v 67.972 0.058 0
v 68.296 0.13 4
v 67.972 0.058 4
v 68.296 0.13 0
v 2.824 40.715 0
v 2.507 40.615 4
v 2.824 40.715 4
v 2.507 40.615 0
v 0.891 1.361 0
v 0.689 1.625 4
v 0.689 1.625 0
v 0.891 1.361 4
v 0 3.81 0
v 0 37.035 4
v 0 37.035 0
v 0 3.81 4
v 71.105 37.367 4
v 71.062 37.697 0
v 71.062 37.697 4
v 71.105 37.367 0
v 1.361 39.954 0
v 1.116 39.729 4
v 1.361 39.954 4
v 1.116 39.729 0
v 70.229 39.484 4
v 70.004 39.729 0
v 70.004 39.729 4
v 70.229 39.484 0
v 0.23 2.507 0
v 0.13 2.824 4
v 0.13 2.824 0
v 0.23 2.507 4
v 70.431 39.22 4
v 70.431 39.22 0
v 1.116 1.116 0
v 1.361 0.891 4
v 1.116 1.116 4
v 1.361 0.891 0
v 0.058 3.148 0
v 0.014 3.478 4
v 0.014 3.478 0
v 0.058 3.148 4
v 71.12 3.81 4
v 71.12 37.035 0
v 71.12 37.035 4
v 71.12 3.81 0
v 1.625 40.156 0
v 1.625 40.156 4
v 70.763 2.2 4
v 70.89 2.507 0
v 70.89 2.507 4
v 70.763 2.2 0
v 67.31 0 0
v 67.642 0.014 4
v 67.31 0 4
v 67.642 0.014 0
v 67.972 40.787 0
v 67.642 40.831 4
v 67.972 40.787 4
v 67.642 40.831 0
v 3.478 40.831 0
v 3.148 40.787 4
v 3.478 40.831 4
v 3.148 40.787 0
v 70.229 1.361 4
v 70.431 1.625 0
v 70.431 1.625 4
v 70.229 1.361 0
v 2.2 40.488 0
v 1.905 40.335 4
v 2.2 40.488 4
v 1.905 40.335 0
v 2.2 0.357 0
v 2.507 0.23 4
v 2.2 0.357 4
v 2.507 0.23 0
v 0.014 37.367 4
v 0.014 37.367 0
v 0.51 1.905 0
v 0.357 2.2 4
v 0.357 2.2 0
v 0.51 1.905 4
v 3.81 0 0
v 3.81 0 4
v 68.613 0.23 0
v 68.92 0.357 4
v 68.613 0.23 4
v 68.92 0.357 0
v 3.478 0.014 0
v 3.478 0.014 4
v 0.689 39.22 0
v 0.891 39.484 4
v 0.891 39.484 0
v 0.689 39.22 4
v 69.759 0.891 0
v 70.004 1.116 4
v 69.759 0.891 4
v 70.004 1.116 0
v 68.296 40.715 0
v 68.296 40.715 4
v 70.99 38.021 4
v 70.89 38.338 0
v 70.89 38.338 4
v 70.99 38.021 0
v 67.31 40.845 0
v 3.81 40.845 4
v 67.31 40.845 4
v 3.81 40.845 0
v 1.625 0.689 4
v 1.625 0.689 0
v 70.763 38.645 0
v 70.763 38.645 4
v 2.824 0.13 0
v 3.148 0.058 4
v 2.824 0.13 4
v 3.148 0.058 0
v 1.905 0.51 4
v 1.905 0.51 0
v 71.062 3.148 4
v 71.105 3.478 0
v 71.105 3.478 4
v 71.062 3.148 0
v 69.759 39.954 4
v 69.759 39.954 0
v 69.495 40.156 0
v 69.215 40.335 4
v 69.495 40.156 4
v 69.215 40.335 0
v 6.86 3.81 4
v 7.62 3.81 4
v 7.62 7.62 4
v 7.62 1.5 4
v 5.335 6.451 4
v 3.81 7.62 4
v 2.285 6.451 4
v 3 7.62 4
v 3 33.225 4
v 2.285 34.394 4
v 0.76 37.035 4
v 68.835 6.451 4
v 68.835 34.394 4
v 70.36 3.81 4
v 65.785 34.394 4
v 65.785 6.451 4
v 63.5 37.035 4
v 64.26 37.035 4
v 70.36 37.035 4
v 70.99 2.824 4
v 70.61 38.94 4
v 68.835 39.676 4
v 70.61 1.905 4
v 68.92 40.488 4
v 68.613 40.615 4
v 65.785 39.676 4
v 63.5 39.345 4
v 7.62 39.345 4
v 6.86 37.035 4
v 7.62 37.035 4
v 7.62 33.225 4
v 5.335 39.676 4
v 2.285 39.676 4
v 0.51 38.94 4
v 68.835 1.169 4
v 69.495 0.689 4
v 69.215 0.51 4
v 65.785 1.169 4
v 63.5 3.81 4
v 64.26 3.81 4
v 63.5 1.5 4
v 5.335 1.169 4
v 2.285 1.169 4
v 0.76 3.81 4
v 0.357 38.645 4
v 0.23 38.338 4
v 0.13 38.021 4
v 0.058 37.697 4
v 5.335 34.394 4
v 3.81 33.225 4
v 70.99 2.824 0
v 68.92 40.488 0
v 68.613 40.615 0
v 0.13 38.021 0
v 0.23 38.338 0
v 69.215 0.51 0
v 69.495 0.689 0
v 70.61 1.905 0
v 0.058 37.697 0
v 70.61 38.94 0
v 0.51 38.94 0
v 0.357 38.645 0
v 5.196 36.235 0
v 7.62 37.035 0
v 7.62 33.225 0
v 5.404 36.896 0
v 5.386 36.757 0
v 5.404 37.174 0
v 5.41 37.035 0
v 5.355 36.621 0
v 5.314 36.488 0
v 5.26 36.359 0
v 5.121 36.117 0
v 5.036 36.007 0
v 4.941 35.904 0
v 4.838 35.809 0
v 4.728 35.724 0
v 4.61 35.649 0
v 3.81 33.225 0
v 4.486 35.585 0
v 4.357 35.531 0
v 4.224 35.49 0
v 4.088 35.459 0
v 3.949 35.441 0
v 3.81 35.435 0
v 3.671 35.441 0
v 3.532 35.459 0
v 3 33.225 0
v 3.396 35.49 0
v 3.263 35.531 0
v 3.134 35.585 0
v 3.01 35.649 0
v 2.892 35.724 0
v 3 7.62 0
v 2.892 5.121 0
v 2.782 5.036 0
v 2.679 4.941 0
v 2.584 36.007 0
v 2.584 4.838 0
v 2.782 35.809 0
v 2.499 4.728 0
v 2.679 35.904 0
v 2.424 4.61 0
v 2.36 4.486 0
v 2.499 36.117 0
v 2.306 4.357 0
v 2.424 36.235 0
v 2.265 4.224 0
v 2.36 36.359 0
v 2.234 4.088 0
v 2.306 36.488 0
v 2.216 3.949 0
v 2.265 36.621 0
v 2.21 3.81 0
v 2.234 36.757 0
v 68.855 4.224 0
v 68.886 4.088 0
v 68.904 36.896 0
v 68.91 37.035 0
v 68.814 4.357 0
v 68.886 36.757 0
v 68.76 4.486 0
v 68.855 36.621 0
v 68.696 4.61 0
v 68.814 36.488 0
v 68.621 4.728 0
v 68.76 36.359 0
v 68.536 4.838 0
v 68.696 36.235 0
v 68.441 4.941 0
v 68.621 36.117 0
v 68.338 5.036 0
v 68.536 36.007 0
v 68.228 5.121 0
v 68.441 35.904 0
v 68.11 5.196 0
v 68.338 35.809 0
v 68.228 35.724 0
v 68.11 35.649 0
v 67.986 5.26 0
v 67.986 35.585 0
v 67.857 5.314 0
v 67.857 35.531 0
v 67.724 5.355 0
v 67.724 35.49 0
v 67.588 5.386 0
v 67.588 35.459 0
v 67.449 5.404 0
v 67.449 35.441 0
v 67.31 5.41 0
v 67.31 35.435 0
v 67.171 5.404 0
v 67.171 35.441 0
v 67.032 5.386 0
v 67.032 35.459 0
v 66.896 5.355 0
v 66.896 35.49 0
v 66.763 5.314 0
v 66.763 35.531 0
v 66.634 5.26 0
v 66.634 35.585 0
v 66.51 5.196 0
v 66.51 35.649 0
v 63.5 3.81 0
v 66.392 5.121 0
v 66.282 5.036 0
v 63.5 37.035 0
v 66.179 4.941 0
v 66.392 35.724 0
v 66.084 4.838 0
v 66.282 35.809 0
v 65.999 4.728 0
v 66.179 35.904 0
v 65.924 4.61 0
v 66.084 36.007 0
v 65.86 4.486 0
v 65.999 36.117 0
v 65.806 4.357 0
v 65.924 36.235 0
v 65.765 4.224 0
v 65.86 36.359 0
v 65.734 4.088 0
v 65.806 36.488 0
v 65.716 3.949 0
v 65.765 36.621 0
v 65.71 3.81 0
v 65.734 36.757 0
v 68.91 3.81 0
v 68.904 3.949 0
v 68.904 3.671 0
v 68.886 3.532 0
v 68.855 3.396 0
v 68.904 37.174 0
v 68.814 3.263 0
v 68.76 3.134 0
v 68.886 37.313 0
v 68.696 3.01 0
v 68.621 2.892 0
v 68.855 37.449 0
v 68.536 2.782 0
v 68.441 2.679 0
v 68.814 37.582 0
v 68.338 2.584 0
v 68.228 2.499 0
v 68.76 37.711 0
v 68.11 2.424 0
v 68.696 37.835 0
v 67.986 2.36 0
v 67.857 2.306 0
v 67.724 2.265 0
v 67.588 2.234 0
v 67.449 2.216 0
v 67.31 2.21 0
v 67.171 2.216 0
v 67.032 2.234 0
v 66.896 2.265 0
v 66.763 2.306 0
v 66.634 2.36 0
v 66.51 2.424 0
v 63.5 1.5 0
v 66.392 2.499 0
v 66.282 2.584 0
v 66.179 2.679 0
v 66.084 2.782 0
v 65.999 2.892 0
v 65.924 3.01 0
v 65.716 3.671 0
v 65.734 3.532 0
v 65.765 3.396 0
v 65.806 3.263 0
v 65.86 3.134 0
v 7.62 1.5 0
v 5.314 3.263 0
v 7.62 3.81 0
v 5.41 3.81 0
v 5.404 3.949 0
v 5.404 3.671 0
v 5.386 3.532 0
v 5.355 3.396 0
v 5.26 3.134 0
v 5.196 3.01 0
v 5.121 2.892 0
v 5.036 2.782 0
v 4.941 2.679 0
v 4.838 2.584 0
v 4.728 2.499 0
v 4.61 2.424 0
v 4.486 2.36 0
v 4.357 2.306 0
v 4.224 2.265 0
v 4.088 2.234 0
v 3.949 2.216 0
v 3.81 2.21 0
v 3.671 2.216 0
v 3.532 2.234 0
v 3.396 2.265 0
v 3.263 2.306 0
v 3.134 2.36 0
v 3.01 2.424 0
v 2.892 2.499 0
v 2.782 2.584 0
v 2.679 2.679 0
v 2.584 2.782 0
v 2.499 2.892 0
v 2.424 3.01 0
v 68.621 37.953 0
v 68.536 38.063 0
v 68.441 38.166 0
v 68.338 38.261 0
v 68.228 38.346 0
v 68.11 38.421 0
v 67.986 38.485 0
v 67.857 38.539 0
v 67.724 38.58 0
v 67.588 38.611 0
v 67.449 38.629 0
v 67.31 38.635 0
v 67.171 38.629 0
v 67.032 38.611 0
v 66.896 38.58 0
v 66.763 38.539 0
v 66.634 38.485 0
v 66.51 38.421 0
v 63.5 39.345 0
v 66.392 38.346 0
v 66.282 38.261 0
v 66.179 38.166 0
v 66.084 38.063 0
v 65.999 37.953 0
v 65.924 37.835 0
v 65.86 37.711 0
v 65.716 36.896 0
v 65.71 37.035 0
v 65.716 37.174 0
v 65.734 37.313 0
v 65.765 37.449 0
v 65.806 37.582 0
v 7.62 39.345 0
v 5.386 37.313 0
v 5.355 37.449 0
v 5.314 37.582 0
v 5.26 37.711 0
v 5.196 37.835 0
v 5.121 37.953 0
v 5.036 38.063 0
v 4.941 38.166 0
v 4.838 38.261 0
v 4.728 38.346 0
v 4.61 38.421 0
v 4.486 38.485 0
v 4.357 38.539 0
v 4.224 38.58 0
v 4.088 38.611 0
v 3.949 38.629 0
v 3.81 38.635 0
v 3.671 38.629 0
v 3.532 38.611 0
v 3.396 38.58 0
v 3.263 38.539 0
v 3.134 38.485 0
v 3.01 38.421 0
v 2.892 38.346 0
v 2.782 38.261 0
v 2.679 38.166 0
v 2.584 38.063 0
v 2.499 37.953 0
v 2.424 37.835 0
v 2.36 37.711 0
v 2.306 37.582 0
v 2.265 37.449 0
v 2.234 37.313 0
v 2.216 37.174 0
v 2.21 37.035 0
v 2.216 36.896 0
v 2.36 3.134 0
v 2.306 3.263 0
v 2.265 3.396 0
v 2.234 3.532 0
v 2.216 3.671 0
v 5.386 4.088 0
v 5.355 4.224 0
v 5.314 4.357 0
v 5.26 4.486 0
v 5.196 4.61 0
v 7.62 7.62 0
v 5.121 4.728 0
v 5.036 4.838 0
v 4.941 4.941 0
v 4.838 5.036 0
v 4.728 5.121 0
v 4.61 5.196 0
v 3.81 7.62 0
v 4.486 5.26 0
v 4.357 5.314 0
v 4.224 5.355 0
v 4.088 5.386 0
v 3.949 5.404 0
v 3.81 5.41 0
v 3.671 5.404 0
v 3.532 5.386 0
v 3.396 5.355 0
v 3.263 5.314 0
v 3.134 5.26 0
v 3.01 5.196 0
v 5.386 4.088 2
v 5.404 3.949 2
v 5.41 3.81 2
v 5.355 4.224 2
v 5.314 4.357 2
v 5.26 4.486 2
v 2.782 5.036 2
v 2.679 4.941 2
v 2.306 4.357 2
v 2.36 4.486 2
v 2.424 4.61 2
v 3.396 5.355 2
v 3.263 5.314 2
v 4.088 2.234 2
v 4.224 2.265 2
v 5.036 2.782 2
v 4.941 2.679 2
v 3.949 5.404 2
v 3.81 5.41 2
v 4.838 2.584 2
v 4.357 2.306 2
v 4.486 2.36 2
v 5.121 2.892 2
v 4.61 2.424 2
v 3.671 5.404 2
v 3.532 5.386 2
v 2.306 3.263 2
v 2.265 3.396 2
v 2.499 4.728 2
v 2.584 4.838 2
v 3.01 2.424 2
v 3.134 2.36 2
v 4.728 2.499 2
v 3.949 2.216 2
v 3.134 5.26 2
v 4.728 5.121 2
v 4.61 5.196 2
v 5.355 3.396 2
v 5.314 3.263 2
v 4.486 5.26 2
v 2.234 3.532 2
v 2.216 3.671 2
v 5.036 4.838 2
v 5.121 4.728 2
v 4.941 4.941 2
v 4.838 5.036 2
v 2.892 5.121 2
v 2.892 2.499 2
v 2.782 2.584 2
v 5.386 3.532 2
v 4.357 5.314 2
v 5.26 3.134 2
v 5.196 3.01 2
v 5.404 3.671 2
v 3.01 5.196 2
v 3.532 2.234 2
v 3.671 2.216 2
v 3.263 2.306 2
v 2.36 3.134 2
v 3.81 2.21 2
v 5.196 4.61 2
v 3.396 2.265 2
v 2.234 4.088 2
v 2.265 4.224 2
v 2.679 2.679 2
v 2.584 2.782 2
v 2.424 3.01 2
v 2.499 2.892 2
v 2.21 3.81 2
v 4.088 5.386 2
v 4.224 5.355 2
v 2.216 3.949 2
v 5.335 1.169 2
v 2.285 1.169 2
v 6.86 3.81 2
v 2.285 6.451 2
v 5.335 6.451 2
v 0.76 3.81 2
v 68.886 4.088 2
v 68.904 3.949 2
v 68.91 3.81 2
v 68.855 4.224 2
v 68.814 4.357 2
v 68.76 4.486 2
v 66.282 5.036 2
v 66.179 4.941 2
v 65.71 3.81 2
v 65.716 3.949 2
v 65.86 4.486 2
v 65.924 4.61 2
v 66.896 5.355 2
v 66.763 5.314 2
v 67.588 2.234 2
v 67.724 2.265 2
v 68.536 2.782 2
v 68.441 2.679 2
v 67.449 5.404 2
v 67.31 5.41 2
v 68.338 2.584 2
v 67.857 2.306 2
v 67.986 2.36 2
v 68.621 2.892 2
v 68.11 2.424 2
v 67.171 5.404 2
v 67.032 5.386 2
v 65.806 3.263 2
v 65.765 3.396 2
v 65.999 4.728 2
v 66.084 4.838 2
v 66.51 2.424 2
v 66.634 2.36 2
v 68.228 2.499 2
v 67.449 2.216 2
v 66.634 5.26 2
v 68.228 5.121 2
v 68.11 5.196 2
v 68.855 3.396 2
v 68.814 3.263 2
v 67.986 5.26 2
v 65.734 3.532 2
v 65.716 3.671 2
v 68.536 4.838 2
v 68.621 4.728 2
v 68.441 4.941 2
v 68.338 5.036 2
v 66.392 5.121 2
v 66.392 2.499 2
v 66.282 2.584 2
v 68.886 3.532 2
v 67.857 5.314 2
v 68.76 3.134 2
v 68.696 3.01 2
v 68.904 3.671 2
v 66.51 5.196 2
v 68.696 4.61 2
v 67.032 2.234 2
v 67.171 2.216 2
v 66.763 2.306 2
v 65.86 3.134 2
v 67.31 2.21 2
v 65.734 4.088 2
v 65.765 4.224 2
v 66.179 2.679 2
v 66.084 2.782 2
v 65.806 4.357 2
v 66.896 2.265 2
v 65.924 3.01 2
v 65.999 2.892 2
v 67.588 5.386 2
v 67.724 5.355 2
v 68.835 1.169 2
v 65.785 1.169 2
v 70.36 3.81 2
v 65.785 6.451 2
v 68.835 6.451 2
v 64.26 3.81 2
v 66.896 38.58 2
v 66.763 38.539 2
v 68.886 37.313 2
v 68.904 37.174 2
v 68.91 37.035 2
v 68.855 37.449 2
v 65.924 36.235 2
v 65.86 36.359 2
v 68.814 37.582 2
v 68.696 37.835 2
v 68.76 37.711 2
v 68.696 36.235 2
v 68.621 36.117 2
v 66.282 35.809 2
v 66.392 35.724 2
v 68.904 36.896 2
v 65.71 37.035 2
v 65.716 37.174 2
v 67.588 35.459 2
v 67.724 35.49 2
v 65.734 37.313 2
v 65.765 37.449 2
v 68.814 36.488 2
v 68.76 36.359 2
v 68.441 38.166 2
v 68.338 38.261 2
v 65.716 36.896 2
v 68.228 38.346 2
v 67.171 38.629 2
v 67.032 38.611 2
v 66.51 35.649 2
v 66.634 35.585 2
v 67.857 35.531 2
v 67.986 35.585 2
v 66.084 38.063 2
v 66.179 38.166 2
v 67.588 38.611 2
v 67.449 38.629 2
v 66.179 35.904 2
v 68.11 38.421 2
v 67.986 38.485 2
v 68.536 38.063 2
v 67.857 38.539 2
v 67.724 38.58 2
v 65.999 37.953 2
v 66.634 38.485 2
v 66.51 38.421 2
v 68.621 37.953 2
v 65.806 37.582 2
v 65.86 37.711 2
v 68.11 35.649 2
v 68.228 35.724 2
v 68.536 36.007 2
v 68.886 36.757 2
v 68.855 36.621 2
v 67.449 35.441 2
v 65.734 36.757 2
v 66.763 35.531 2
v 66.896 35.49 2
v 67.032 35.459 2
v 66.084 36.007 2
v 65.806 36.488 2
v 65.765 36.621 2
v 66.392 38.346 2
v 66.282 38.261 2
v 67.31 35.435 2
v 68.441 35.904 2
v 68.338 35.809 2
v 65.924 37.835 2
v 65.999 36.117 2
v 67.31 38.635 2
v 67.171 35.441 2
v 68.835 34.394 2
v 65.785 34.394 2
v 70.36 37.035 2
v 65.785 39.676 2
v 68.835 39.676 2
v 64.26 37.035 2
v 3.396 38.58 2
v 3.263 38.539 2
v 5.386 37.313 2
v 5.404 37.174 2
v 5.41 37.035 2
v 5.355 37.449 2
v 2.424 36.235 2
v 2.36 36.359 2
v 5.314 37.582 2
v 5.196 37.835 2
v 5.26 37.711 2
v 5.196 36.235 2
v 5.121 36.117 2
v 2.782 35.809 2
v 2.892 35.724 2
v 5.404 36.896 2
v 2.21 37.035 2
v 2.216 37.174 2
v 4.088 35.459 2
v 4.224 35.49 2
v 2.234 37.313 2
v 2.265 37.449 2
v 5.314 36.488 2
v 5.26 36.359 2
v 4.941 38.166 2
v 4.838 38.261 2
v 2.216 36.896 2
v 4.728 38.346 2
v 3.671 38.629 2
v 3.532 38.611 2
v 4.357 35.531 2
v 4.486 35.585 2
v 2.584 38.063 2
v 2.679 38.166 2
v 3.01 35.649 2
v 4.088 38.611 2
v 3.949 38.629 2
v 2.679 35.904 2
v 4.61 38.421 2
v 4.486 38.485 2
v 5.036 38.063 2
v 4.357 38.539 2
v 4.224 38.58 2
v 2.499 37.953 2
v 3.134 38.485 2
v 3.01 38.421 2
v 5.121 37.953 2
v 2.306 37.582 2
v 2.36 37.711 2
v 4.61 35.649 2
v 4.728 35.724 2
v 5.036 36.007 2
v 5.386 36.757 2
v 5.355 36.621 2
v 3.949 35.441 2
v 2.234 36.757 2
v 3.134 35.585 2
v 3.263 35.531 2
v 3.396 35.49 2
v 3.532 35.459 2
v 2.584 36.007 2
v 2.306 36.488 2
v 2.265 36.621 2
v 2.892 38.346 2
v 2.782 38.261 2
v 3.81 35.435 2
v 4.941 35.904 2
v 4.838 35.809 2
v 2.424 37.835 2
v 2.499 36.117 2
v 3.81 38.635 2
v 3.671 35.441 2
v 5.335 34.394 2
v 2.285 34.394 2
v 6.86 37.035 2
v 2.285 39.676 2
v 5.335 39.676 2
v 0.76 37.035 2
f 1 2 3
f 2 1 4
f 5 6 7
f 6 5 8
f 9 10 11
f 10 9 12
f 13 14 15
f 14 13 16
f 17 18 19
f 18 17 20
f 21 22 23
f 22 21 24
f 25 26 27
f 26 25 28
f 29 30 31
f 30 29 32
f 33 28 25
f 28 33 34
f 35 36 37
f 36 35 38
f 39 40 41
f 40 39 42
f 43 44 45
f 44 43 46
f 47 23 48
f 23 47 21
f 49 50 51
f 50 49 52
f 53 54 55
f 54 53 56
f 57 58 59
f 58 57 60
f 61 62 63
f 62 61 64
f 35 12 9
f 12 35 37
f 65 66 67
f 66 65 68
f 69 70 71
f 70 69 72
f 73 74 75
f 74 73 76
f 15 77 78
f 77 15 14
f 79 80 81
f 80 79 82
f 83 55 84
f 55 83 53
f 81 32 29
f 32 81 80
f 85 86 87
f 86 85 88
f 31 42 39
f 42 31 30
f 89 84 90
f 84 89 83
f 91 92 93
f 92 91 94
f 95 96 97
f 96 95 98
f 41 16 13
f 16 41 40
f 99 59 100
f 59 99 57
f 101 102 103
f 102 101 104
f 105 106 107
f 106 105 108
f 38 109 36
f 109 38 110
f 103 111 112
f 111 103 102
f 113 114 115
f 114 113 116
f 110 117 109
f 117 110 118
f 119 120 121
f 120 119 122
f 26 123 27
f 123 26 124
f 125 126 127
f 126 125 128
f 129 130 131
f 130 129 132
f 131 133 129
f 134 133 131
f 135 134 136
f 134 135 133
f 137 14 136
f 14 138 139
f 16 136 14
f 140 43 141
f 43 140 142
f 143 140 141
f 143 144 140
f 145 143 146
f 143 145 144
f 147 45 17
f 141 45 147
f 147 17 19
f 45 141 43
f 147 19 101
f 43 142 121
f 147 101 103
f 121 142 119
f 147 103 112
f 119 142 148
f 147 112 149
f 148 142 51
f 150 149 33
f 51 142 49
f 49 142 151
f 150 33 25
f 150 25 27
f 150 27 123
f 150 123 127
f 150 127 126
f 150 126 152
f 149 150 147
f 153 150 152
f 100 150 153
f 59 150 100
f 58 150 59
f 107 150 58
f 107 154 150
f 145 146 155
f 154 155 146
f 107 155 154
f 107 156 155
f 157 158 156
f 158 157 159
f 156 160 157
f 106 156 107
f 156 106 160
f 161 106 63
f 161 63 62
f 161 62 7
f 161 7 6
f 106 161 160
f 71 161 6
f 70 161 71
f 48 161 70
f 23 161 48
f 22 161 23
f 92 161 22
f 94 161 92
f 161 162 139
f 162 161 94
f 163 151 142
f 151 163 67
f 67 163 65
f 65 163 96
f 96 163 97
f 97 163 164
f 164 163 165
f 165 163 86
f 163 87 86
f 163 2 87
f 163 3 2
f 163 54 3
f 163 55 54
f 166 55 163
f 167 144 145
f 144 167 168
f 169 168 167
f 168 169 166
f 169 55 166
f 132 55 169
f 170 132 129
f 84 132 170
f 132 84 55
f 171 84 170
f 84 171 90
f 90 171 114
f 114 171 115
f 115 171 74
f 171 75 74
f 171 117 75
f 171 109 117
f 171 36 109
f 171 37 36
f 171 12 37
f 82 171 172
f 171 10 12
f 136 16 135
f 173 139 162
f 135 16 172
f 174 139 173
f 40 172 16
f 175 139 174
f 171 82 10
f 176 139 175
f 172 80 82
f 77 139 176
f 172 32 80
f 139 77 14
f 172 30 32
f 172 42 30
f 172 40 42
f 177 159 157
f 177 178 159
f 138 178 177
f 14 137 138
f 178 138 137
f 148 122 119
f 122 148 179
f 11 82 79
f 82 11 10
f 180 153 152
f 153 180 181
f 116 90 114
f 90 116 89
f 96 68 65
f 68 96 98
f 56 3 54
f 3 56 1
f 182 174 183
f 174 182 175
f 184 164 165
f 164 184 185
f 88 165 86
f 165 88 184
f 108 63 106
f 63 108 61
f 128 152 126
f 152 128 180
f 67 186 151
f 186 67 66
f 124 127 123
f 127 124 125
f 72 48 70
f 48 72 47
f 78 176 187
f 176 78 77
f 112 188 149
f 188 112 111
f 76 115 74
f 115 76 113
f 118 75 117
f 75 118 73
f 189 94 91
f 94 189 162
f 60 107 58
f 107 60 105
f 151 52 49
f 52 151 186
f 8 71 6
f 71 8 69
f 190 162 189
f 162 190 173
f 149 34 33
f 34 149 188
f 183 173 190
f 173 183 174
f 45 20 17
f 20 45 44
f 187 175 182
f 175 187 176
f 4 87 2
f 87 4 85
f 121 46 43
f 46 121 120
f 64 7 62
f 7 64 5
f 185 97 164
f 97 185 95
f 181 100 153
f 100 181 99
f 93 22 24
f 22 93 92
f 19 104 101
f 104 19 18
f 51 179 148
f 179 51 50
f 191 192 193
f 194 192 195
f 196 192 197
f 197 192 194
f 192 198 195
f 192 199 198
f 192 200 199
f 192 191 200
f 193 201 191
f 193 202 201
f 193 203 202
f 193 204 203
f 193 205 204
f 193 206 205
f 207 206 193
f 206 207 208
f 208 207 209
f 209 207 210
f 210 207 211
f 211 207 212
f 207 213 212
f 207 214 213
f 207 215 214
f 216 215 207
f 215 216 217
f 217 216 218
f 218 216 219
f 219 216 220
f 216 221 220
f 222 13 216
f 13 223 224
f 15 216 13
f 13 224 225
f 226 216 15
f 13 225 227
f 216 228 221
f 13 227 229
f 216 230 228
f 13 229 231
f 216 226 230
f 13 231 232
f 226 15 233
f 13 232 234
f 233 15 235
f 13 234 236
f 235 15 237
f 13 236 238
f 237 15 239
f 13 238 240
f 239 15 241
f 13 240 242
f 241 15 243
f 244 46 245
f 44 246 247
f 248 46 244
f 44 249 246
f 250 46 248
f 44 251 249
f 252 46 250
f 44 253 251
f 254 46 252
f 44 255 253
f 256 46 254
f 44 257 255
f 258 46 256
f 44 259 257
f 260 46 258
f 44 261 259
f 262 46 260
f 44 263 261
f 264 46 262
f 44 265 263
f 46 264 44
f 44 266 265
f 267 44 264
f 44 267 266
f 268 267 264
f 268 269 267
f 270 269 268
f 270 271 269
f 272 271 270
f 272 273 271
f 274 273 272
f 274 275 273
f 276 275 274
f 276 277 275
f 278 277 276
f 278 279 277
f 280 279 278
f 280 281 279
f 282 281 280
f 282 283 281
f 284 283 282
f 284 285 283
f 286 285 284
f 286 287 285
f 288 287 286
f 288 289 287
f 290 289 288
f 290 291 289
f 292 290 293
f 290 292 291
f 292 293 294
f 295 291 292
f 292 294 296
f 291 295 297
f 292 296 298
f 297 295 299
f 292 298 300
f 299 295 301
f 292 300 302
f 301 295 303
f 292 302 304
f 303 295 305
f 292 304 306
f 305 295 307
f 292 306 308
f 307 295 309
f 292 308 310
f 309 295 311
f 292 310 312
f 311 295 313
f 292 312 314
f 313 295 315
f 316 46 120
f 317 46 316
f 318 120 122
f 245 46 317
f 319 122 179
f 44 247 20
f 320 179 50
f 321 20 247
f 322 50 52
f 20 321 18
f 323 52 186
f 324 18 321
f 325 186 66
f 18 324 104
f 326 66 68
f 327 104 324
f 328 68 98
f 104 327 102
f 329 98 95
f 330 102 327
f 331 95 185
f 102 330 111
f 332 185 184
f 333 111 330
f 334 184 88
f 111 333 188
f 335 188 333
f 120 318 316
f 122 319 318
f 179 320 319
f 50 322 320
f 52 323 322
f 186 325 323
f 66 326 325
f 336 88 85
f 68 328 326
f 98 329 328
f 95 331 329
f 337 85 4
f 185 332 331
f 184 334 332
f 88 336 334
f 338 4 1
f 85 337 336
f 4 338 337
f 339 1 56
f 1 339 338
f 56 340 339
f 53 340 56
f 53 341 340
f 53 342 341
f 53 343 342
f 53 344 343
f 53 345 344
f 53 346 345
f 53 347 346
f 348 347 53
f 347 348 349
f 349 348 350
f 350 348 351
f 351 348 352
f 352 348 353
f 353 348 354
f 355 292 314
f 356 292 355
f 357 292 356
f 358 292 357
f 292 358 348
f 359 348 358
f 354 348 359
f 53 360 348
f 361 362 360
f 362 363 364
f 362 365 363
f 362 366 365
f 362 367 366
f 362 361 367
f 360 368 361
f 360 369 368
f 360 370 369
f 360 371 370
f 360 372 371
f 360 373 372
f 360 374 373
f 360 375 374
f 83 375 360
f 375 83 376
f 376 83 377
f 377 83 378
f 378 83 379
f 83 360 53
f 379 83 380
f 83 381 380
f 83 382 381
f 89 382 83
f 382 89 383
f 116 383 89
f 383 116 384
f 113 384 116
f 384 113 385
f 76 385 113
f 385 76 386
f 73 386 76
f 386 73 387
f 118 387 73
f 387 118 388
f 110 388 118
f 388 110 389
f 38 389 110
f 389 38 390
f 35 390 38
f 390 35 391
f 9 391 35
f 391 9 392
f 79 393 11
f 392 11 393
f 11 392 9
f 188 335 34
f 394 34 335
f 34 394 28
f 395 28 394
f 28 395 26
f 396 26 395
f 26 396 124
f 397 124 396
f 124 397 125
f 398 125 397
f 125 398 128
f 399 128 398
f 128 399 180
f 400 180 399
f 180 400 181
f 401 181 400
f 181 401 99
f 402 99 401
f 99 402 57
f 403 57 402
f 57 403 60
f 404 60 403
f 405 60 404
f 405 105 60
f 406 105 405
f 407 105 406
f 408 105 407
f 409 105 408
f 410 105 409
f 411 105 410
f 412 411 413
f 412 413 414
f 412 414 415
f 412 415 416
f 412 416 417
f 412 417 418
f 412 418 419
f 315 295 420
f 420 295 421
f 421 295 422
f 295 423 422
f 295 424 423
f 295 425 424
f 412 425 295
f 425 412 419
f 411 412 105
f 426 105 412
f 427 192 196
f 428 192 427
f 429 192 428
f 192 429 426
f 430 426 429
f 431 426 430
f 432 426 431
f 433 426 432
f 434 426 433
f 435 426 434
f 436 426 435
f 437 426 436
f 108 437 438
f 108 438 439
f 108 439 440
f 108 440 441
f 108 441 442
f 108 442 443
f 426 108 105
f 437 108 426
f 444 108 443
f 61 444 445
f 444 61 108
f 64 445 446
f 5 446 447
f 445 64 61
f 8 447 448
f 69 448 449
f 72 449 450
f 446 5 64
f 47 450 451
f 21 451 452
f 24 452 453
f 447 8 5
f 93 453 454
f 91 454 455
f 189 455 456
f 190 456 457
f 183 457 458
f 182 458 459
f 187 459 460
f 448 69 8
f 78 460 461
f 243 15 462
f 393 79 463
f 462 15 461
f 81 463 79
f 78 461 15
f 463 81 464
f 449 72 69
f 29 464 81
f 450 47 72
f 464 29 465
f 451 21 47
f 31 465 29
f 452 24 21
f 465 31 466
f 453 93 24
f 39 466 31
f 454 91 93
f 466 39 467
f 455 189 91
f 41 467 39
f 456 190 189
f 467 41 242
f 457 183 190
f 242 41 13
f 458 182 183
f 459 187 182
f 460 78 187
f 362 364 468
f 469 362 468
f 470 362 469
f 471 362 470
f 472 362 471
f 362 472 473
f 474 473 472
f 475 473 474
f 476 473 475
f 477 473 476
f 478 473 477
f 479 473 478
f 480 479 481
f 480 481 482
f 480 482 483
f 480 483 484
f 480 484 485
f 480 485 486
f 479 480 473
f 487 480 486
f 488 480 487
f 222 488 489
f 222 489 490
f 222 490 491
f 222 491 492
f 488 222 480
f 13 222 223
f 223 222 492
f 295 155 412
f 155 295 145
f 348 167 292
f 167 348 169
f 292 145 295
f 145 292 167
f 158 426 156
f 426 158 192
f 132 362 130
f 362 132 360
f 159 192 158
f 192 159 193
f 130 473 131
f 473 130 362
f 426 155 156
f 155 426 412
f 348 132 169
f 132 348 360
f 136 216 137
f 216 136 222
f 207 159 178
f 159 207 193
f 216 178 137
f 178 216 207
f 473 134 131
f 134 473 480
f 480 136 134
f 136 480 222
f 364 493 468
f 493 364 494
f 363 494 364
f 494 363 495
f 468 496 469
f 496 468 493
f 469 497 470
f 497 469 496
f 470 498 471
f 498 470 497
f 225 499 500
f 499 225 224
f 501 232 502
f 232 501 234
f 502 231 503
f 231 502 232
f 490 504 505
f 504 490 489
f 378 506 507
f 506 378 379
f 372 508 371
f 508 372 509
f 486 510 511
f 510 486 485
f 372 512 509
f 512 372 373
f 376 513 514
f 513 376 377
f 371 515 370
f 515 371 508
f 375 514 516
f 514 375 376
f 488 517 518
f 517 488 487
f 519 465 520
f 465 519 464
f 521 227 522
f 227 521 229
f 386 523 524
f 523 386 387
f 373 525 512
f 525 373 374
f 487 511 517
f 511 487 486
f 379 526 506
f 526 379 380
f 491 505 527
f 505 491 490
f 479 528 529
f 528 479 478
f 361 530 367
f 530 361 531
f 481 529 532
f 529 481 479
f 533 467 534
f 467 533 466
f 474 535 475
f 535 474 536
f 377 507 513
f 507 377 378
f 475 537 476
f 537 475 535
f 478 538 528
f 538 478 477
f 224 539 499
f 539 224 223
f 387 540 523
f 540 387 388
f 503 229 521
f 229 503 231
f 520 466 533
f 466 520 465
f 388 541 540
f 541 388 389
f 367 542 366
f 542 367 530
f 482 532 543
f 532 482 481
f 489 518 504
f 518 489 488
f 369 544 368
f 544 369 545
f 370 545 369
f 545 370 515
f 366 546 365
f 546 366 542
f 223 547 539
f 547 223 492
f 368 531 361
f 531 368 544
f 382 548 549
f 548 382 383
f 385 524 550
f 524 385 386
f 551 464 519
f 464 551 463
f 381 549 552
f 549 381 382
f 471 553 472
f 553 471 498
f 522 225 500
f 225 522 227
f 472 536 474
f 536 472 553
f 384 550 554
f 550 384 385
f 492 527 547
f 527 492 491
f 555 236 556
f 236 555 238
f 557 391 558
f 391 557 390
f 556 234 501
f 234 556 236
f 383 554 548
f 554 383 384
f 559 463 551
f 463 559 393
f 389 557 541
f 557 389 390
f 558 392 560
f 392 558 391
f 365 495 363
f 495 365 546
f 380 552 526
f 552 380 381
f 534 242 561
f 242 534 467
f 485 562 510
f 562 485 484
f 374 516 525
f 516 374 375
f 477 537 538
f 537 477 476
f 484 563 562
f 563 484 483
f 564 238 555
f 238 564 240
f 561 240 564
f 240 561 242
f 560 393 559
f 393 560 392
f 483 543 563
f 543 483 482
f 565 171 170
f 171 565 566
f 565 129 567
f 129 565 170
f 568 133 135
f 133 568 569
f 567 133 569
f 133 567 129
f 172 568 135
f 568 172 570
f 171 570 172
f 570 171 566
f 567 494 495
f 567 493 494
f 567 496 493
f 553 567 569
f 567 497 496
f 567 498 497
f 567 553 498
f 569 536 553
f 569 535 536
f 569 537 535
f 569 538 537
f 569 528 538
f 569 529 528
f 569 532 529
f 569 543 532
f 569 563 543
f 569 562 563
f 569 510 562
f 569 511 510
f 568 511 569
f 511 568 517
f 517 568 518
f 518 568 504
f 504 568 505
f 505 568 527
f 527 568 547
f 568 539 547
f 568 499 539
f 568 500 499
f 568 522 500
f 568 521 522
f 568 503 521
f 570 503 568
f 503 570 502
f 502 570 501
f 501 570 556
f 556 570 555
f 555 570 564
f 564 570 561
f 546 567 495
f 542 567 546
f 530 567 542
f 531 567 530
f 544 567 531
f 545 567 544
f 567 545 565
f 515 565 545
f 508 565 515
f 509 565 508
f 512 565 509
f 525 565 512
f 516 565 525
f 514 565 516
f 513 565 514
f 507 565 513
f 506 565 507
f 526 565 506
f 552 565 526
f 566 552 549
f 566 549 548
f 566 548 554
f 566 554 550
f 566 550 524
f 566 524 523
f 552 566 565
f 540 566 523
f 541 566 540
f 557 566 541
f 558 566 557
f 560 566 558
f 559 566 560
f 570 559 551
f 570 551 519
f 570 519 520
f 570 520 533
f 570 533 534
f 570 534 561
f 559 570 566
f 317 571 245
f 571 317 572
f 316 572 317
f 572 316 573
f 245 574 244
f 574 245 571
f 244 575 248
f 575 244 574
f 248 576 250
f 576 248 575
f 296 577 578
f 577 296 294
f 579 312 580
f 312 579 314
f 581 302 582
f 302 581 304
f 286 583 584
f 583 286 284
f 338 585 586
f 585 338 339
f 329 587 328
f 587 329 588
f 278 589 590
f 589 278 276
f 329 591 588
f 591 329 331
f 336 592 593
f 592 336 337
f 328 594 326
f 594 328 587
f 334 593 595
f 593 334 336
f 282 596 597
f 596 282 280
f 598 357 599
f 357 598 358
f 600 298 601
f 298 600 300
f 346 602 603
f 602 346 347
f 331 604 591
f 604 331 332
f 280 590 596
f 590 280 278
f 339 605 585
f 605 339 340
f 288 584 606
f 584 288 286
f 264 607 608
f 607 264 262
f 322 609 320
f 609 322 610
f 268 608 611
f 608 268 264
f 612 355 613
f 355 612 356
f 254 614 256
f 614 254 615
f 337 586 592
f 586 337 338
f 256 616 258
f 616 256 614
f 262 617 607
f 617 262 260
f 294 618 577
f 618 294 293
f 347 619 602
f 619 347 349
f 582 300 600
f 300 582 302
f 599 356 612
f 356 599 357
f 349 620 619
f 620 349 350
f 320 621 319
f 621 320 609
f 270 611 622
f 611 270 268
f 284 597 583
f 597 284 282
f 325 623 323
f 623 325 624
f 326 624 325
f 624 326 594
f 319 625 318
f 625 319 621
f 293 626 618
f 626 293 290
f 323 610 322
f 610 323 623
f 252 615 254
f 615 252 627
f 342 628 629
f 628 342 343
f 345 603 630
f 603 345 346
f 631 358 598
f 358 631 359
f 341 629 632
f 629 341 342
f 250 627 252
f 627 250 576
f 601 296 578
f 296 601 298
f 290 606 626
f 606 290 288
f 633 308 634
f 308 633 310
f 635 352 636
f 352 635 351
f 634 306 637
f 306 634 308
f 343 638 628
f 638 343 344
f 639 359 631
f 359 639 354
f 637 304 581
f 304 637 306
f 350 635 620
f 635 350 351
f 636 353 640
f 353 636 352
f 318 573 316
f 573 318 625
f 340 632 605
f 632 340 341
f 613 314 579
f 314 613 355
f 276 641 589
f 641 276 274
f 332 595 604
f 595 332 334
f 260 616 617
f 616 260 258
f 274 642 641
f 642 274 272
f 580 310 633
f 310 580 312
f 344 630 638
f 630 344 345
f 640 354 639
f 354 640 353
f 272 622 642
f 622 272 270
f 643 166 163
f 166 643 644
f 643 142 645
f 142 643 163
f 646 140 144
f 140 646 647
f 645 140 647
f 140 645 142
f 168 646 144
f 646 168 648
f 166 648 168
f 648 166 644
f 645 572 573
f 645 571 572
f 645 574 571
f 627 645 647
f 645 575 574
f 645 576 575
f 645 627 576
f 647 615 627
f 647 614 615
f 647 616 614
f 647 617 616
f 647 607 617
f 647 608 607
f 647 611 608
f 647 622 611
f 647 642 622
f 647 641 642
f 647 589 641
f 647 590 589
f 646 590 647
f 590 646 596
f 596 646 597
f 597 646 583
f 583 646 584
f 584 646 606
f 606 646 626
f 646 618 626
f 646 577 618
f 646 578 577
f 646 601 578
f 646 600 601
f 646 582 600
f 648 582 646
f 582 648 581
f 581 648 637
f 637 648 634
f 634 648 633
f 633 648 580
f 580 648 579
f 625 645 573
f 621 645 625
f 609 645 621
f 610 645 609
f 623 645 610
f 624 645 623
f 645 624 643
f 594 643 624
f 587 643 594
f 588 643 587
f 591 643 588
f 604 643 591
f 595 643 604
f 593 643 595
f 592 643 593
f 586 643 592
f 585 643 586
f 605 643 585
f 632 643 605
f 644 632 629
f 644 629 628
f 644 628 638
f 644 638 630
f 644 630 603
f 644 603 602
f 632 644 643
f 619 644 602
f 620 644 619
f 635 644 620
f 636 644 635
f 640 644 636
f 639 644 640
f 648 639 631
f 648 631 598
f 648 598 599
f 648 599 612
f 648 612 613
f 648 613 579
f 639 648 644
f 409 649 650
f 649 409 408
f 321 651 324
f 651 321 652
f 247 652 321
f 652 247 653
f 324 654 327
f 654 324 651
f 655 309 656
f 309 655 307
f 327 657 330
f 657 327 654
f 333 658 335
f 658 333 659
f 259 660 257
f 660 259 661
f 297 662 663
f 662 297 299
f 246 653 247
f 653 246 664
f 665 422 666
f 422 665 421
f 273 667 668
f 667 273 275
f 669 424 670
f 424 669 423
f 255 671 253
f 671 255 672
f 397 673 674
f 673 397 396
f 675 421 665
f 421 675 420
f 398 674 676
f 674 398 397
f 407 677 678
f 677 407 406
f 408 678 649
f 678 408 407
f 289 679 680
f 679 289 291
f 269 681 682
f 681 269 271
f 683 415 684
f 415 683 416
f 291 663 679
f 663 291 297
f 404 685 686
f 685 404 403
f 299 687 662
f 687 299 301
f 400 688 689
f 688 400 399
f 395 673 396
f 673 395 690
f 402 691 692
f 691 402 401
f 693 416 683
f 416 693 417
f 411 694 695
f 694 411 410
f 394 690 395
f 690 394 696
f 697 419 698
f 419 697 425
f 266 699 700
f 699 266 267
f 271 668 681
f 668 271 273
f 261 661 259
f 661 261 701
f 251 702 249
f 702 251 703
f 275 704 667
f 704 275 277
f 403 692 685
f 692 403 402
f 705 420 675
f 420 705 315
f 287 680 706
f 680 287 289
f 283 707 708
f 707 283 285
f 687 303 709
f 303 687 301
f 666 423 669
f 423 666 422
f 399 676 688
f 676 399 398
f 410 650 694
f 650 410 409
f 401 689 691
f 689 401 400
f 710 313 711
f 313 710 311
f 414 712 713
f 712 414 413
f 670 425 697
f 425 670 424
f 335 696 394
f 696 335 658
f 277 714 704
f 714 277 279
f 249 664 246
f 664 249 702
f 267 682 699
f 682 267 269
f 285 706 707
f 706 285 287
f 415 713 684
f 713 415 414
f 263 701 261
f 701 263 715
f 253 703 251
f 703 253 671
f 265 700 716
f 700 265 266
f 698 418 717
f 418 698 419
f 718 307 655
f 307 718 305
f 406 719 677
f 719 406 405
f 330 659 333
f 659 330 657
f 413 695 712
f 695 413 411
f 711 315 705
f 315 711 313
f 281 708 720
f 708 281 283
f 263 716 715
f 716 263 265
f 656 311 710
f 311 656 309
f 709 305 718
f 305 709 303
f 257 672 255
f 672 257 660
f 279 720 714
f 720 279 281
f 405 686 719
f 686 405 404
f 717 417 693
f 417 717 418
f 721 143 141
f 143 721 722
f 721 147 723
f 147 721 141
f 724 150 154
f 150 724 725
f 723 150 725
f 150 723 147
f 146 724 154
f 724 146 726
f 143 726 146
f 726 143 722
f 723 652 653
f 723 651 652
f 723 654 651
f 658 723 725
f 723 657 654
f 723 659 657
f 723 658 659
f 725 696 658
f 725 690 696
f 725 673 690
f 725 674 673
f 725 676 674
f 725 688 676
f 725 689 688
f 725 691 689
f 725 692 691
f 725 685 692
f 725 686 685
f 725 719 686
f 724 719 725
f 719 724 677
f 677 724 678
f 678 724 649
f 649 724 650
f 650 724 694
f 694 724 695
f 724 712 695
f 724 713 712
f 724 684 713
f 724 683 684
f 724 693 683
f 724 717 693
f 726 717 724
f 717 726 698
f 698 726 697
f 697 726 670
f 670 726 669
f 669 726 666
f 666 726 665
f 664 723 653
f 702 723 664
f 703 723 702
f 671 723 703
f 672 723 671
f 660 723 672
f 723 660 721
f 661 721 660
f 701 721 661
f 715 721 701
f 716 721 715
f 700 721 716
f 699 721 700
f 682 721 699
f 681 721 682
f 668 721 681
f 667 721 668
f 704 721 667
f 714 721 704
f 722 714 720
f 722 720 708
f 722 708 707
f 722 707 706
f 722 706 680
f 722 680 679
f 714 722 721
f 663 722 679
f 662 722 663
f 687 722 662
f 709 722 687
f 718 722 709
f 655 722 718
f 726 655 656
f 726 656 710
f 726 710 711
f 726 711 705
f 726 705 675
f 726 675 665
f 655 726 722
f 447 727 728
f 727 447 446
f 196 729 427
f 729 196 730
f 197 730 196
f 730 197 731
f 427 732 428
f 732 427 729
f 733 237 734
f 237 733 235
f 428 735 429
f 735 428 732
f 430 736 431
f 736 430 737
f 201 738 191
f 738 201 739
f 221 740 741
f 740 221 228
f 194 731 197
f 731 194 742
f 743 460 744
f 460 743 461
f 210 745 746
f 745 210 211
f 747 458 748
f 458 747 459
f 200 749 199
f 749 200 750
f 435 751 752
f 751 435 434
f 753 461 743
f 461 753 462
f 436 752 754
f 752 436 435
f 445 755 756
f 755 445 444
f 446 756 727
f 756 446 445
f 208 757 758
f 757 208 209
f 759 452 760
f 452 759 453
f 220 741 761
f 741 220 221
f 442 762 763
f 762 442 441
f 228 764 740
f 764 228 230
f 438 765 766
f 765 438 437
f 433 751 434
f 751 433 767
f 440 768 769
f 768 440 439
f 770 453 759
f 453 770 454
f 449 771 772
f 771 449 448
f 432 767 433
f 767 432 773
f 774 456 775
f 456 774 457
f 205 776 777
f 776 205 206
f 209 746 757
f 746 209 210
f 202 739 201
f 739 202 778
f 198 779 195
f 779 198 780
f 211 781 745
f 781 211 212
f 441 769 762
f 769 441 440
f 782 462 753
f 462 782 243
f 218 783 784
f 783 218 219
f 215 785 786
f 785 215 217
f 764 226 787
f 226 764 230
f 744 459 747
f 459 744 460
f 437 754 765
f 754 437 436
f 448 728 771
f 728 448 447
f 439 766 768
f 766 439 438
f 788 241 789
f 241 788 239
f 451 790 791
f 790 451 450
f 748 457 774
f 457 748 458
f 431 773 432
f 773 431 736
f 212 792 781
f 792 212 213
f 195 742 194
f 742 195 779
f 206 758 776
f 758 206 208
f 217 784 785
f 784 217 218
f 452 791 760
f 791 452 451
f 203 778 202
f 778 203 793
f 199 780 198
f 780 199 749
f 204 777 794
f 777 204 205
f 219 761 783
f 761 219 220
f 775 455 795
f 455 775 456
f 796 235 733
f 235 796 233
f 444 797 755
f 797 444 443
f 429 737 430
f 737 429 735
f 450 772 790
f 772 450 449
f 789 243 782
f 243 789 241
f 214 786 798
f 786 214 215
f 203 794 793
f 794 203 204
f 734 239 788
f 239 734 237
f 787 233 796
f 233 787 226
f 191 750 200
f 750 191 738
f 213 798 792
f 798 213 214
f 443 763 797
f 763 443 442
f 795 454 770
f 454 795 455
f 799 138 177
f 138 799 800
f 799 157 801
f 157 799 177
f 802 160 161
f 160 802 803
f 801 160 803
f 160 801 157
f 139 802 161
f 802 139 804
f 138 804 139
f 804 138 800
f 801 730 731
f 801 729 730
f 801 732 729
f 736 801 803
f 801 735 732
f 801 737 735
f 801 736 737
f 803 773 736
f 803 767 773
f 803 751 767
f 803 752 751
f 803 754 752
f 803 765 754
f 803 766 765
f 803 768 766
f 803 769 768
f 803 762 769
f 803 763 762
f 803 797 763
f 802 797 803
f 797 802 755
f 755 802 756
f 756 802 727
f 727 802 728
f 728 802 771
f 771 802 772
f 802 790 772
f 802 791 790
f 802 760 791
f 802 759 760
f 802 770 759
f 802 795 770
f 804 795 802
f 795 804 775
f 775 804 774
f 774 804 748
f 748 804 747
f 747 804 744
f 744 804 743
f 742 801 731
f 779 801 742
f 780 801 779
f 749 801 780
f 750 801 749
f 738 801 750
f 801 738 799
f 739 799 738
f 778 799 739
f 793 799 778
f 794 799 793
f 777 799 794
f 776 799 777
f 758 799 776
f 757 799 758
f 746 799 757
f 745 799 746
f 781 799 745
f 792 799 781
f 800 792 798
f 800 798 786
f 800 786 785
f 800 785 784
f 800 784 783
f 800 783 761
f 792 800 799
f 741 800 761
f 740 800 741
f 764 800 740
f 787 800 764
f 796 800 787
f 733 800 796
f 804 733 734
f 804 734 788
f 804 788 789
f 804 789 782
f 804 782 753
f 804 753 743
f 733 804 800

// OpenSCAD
$fn = 72;
e = 0.1;

// total size
w = 71.120;
h = 40.845;
r = 3.81;
t = 4;

// screw size
sd = 3.2; // thread diameter
shd = 6.1; // head diameter
hl = 2; // hole length (t - hl >= 2)

holes = [
	[r, r, 0],
	[w - r, r, 90],
	[w - r, h - r, 180],
	[r, h - r, 270]
];

module rounded_rect(x, y, r) {
	hull() {
		translate([r, r]) circle(r);
		translate([x - r, r]) circle(r);
		translate([x - r, y - r]) circle(r);
		translate([r, y - r]) circle(r);
	}
}

difference() {
	union() {
		difference() {
			linear_extrude(t) rounded_rect(w, h, r);
			translate([r*2, 1.5, -e]) cube([w - r*4, h - 1.5*2, t + 2*e]);
			translate([3, r*2, -e]) cube([w - r*4 - 1.5, h - r*4, t + 2*e]);
		}
		
		for (p = holes) {
			translate([p[0], p[1]]) cylinder(h=t, r=r);
		}
	}

	for (p = holes) {
		translate([p[0], p[1], -e]) cylinder(h=t + 2*e, d=sd);
	 	translate([p[0], p[1], t - hl]) cylinder(h=t, d=shd, $fn=6);
	}
}
